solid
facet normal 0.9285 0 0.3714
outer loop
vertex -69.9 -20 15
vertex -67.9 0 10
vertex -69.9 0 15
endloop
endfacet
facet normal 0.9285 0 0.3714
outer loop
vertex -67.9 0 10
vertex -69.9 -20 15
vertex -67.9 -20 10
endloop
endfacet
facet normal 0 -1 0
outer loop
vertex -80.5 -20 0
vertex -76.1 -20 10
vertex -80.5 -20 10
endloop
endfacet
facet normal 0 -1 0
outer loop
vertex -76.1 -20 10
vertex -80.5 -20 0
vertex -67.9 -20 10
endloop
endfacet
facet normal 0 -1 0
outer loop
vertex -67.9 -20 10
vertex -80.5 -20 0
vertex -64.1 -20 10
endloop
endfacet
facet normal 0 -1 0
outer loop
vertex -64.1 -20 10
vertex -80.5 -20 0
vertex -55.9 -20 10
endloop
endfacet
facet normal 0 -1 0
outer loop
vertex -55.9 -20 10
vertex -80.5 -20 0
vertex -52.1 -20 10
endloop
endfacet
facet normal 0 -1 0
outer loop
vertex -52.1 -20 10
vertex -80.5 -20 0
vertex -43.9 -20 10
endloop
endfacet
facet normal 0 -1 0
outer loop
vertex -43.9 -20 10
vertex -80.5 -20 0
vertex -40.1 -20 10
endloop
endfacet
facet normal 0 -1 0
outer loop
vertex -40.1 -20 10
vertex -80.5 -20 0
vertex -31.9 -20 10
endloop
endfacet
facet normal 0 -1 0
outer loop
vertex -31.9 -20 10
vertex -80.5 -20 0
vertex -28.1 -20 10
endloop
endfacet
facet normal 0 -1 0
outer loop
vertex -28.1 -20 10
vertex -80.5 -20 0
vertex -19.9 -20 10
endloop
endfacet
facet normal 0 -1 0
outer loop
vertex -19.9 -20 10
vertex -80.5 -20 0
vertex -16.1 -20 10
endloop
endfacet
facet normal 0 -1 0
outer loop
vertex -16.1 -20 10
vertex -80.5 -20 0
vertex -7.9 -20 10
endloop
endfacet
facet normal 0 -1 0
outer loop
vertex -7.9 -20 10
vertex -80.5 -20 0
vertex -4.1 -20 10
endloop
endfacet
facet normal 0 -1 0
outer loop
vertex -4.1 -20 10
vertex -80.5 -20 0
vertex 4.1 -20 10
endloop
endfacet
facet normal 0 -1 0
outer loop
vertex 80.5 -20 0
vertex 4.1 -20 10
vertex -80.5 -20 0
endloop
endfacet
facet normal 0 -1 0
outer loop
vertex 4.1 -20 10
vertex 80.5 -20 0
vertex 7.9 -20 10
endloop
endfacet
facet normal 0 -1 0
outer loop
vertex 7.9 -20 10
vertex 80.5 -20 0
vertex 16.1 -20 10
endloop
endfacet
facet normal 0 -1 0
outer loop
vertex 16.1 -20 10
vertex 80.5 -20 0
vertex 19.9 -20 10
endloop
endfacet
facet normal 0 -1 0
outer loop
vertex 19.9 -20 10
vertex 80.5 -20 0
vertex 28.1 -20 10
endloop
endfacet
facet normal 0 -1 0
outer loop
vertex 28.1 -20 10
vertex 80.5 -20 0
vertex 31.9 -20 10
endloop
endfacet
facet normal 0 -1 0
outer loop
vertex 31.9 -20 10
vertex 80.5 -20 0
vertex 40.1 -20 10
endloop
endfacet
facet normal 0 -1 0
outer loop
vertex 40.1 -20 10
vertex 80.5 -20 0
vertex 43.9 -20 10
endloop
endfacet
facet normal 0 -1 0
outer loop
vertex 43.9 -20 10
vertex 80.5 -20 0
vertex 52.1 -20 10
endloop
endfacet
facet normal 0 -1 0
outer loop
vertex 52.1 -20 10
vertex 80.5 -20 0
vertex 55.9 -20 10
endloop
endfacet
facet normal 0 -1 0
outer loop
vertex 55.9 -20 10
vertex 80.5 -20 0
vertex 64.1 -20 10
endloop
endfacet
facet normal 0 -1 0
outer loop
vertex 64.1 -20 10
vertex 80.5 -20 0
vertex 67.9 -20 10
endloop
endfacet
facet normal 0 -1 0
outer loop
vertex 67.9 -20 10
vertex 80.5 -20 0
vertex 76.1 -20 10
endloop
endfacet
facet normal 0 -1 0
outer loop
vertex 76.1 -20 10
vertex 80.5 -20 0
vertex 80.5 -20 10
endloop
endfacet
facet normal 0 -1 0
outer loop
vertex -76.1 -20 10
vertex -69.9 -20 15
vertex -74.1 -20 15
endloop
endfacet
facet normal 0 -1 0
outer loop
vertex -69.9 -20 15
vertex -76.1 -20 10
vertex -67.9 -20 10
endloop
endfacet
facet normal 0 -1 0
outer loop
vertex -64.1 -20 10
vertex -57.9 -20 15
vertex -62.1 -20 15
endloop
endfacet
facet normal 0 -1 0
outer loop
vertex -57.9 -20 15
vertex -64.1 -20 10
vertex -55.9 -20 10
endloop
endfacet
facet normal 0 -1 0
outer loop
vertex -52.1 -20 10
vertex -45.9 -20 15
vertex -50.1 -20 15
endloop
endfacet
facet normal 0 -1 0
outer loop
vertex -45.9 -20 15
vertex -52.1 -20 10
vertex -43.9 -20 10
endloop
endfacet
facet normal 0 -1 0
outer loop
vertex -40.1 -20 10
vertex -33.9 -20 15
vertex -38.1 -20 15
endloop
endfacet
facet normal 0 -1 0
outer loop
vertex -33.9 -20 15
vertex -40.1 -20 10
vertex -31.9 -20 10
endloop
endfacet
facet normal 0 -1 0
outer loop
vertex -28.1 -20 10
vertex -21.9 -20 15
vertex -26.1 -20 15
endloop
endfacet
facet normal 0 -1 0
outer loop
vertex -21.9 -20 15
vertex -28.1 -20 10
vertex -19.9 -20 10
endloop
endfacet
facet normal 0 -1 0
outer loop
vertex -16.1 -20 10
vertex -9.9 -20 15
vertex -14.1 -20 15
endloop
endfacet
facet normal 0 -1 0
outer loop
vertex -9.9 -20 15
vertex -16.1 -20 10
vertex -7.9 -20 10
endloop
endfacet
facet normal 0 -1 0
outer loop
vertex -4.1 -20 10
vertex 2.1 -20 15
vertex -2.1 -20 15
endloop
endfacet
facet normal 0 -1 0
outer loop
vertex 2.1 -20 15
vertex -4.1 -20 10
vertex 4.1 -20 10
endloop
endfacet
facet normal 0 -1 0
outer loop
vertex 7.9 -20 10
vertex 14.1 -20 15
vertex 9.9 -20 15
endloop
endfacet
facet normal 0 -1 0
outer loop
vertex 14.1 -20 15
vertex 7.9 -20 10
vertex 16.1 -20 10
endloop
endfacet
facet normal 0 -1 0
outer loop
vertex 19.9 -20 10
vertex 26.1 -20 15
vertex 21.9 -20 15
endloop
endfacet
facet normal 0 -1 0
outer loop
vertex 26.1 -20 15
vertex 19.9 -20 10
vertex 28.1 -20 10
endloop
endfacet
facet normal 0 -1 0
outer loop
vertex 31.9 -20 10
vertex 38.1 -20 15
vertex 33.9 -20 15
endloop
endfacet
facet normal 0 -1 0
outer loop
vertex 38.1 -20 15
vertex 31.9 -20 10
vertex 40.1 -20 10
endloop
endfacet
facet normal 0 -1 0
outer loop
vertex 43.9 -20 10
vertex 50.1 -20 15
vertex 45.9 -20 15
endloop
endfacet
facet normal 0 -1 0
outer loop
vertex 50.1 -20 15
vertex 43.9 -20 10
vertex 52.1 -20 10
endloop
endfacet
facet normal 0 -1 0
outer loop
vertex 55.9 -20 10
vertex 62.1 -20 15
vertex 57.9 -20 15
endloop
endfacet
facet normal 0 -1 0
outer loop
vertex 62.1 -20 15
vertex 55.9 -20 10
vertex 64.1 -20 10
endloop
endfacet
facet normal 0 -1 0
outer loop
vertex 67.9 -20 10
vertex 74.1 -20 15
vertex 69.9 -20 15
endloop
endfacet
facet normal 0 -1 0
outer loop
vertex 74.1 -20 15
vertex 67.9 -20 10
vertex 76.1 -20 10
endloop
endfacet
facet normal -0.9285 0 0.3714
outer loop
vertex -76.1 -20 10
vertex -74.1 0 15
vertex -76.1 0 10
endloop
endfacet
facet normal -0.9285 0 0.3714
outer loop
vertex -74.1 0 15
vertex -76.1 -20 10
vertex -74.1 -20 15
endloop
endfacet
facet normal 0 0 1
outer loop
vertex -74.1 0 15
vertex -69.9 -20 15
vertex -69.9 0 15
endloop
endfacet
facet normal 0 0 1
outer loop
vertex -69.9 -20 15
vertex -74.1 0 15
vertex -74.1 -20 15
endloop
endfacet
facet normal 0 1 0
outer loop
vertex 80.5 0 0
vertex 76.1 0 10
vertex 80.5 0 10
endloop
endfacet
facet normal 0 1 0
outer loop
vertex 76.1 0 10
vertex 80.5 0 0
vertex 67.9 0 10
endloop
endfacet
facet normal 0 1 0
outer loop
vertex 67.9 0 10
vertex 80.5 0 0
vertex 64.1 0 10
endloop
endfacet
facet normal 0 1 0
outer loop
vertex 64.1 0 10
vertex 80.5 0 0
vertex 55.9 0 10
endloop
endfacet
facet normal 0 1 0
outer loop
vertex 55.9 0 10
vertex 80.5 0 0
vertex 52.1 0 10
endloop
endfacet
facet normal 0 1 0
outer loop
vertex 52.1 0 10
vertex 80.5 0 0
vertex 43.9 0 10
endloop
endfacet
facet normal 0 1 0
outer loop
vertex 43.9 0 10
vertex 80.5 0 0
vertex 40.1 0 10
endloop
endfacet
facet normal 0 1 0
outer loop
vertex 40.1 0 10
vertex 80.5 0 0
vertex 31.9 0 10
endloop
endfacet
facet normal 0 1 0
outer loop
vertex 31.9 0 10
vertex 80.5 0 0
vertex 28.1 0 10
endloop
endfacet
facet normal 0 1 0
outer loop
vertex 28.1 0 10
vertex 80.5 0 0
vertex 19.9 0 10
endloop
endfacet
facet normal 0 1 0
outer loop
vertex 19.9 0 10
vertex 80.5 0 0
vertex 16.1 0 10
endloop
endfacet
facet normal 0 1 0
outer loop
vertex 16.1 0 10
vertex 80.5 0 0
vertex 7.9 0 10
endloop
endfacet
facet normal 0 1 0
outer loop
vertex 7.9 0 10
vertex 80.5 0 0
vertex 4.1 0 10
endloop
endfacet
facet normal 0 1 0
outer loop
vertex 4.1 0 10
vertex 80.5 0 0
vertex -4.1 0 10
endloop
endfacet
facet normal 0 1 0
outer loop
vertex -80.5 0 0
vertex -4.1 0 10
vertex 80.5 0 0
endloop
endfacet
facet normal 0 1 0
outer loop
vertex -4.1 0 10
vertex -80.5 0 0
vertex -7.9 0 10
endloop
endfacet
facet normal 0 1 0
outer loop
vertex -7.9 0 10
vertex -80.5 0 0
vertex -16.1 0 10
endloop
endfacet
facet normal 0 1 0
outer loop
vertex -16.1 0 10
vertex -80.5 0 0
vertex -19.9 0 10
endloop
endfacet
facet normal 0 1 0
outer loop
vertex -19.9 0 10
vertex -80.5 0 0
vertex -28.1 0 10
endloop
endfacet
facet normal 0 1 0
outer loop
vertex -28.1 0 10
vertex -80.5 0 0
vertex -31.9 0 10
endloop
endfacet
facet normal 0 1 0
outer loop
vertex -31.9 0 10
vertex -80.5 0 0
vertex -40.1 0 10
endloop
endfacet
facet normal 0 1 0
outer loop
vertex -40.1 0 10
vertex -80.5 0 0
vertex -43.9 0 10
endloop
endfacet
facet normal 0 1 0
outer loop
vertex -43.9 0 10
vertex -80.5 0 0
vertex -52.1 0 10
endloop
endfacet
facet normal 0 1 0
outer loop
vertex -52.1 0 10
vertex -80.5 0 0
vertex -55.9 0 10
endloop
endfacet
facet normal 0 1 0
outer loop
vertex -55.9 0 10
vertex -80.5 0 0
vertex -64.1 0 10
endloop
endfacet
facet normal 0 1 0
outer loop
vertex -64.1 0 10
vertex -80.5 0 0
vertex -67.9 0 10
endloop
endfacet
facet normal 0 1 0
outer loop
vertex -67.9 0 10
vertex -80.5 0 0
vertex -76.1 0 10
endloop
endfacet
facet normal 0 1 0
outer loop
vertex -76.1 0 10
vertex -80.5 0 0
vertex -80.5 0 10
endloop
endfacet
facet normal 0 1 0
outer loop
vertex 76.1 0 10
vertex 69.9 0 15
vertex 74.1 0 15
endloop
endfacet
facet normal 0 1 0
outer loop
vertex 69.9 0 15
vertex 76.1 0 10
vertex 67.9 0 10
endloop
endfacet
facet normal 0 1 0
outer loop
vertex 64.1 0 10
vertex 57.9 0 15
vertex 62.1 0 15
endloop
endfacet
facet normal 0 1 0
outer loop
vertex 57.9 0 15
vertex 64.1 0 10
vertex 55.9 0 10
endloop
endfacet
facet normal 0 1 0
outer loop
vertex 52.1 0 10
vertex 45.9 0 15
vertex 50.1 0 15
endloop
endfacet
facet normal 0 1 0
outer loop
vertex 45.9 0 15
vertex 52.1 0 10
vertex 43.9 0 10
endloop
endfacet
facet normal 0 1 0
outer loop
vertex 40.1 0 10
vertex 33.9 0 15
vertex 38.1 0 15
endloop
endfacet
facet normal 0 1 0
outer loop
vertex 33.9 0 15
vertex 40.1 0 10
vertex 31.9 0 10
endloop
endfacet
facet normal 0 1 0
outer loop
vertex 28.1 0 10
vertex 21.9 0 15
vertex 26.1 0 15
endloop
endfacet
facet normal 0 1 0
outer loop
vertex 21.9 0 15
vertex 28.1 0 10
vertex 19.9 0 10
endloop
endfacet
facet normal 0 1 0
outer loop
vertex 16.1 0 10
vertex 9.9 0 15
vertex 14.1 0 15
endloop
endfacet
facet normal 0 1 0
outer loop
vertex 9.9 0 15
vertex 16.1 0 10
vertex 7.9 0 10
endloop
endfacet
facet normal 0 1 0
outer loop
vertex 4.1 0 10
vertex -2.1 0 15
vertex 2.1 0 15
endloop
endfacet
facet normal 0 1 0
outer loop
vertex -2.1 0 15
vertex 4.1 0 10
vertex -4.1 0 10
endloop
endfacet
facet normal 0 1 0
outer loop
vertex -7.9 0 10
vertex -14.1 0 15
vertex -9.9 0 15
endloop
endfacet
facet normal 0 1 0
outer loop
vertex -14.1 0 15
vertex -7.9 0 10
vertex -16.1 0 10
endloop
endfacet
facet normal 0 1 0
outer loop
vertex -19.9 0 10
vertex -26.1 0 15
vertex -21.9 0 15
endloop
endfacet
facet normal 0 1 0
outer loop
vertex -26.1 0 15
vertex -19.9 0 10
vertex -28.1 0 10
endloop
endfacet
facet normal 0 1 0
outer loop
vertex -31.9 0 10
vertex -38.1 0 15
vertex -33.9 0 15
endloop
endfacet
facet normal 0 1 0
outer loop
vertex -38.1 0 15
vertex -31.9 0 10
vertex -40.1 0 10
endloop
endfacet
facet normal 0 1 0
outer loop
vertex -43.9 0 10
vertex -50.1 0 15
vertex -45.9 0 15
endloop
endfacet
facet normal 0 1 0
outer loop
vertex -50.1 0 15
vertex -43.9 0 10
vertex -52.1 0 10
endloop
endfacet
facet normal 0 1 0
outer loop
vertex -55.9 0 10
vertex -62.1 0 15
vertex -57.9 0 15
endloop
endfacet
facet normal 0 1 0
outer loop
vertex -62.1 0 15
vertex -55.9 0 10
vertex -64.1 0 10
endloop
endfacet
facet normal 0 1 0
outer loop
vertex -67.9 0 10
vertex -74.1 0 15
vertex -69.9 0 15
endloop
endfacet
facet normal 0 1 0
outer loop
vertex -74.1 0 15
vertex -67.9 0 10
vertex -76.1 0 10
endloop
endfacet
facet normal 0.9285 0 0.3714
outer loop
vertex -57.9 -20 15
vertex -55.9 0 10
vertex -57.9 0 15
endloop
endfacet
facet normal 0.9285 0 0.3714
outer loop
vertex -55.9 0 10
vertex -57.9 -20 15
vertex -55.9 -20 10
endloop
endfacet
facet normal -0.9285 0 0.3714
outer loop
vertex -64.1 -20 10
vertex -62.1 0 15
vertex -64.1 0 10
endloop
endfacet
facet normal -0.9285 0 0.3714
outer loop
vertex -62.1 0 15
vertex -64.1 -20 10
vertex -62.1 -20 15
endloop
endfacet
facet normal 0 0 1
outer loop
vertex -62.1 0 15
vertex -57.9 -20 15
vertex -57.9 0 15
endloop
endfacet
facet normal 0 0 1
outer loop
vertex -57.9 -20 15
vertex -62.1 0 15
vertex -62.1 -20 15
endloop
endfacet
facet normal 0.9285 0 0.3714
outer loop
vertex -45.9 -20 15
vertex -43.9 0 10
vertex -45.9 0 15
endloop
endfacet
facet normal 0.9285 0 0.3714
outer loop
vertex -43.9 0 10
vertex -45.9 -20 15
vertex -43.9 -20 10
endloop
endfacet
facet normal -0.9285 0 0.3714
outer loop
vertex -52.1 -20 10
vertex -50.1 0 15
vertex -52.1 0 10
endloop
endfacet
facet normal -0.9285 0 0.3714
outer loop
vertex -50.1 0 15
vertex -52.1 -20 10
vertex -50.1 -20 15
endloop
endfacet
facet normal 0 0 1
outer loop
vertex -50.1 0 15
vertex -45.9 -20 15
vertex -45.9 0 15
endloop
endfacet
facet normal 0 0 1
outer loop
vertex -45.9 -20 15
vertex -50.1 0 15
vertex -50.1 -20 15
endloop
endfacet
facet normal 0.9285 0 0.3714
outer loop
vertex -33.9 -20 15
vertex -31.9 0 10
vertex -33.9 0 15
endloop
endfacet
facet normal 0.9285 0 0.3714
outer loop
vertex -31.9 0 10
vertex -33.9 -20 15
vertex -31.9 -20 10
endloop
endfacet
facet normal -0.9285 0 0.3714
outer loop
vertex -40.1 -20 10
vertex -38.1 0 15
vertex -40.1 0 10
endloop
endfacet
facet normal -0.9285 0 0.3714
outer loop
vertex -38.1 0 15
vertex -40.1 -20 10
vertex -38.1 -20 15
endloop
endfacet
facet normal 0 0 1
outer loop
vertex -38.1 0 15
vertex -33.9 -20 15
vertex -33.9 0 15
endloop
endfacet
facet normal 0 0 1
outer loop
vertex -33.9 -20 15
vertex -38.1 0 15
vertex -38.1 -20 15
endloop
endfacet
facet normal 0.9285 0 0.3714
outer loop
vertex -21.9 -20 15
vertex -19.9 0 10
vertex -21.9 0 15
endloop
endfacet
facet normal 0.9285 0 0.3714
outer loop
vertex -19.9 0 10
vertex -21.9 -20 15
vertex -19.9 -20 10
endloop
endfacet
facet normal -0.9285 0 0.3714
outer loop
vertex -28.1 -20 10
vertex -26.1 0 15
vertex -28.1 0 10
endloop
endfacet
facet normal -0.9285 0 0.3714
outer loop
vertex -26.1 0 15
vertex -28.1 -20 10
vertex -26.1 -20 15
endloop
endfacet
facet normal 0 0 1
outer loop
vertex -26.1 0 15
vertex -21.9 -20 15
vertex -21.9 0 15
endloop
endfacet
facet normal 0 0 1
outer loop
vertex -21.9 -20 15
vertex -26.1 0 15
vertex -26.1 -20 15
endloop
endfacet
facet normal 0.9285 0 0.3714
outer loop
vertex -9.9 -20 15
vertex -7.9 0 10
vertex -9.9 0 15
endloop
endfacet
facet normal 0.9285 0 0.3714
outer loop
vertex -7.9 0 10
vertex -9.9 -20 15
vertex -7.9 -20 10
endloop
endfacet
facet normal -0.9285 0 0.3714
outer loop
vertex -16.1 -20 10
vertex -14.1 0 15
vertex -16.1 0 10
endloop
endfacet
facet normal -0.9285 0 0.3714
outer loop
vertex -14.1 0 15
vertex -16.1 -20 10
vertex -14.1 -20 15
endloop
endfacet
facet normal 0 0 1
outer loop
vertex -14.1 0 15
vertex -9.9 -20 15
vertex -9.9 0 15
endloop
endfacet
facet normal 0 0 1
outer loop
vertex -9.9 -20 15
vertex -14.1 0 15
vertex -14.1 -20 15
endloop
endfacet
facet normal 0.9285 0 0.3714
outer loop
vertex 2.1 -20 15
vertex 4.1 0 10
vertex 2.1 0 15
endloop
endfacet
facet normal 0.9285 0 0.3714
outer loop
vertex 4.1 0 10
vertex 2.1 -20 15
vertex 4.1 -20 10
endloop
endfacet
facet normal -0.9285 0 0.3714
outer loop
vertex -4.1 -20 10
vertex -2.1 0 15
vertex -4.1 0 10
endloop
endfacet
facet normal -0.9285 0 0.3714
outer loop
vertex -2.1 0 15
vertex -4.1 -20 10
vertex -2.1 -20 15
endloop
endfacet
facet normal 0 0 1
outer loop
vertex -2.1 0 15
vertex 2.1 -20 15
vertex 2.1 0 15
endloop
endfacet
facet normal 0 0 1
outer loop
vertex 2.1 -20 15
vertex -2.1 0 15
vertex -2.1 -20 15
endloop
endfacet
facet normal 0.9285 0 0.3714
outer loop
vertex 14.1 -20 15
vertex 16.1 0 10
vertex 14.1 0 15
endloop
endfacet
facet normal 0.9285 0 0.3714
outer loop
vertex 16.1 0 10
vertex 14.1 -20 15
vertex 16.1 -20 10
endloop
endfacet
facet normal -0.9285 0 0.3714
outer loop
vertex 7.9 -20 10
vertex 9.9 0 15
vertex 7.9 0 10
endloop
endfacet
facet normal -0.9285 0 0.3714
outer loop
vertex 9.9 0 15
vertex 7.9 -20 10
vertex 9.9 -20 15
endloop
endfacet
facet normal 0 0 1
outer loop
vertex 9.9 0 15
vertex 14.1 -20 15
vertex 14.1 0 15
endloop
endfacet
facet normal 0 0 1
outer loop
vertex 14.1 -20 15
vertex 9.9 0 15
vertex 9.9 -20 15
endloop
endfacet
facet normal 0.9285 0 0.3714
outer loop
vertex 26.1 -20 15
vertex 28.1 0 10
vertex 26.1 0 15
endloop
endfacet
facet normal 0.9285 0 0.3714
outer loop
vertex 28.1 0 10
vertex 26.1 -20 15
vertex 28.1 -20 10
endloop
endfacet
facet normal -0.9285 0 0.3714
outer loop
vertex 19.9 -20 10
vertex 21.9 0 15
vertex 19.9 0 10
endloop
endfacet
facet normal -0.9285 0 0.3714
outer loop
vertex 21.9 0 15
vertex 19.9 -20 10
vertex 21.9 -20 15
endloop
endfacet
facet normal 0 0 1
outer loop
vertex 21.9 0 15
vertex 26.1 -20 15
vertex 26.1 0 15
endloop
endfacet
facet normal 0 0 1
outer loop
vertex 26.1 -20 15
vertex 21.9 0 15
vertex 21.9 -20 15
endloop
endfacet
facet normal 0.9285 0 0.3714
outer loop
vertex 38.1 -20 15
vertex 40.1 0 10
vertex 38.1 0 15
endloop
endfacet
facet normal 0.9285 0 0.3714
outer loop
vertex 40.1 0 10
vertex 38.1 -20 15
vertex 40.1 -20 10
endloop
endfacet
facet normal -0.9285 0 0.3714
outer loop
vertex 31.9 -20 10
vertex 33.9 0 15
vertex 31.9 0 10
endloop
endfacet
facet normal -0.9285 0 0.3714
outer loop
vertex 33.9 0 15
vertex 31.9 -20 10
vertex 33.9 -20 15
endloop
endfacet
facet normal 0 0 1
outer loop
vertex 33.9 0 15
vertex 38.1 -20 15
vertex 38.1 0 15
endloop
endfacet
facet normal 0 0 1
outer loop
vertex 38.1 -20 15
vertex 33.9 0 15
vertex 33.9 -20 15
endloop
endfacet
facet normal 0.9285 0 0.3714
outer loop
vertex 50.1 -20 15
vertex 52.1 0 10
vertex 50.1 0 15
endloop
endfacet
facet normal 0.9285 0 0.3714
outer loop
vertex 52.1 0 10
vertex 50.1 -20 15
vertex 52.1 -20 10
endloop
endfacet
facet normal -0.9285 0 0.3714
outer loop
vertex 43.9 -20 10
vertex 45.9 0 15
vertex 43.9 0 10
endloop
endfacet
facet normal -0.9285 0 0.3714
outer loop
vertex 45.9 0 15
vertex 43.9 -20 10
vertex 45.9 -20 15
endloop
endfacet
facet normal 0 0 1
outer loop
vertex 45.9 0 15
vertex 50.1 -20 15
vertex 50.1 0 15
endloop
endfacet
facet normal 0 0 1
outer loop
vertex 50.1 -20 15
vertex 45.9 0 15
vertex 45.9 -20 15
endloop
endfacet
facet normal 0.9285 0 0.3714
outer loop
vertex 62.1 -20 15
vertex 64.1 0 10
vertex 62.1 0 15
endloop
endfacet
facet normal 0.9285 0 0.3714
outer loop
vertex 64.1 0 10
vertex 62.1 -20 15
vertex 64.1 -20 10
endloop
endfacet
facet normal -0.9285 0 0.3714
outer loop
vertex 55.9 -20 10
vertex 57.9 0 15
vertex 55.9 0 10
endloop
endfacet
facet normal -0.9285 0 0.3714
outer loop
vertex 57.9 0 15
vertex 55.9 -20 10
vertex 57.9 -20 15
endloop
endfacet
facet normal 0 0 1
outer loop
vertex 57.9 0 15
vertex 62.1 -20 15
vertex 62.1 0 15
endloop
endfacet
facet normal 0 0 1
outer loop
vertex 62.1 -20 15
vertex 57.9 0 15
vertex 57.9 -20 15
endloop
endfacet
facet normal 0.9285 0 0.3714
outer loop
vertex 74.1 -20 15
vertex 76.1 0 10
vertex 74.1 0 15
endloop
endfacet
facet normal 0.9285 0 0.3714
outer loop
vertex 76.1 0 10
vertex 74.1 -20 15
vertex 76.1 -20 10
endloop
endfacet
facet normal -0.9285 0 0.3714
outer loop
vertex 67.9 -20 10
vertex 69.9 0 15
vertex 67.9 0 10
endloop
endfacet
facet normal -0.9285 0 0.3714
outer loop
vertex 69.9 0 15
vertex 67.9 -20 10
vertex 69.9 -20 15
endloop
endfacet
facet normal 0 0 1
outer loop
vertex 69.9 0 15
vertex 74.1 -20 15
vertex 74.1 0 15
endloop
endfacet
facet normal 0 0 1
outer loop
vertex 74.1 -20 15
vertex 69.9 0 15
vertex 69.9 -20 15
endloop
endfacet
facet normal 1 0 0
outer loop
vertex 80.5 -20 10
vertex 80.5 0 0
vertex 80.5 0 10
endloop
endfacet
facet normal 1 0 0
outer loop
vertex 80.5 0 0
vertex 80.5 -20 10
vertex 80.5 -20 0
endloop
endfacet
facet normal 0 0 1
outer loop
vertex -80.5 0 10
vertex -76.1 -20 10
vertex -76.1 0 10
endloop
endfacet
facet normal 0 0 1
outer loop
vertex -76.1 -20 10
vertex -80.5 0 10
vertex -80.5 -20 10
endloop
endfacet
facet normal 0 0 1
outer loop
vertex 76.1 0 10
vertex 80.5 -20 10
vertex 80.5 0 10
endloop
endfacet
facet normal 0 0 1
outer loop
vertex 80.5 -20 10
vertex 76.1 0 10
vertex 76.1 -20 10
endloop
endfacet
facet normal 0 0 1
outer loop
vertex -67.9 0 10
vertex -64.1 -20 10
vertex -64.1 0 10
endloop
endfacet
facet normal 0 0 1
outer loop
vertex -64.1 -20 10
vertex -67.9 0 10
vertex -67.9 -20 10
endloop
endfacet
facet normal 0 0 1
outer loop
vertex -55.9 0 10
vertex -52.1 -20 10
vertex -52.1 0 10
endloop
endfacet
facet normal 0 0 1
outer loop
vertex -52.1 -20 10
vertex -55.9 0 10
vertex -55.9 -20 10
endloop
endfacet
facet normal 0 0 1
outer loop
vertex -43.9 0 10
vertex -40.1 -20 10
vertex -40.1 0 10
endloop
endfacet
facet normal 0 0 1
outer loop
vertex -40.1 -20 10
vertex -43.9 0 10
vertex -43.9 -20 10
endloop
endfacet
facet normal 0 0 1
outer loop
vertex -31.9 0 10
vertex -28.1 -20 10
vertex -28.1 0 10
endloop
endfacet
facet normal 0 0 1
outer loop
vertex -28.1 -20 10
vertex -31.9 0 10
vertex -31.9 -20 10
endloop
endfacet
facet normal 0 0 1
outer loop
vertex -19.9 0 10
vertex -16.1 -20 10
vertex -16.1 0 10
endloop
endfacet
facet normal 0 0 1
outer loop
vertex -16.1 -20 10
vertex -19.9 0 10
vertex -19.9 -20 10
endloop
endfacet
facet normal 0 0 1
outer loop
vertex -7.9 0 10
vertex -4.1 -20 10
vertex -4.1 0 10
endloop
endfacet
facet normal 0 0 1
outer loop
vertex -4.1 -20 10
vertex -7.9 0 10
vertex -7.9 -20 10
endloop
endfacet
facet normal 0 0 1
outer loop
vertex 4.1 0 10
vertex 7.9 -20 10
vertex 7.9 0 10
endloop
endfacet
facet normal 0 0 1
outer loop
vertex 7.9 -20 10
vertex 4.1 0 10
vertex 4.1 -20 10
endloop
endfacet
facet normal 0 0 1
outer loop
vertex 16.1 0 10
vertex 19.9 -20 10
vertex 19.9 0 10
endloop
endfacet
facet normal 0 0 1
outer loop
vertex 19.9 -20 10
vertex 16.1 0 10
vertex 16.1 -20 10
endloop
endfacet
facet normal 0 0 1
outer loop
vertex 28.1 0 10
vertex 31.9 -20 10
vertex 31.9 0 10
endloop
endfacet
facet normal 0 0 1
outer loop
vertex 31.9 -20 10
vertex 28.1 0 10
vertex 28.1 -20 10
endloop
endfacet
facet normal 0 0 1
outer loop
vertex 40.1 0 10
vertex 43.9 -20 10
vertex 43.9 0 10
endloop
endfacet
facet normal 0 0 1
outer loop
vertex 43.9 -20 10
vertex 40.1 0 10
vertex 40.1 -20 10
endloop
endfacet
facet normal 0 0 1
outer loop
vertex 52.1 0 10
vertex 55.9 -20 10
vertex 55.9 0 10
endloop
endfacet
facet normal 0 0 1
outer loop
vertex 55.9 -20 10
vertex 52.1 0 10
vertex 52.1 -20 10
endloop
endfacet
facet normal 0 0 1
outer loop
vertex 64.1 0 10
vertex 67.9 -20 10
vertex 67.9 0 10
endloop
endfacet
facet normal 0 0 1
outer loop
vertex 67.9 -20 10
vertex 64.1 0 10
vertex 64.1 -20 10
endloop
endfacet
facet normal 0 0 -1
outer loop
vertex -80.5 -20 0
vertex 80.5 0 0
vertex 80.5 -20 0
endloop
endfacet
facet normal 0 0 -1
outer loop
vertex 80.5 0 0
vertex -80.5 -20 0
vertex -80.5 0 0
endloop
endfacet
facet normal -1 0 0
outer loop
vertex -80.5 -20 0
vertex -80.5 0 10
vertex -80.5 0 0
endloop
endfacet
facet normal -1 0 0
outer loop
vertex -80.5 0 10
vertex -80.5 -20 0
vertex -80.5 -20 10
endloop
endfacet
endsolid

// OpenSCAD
$fn = 32;

// ----------------------------------------------------------------------
// Toothed rack, 13 teeth
// 12 mm pitch, 5 mm teeth
// ----------------------------------------------------------------------

// --- parameters (mm) ---
bar_w = 20;     // bar width (Y)
bar_h = 10;     // bar height (Z)
teeth = 13;     // number of teeth
pitch = 12;     // tooth pitch
tooth_h = 5;    // tooth height above the bar
root_w = 9;     // tooth width at the root
crest_w = 4.2;  // tooth width at the crest

// --- derived feature positions (mm) ---
span = (teeth - 1) * pitch;  // = 144   distance between the outer teeth
bar_l = span + root_w + 8;   // = 161   bar length: teeth plus 4 mm at each end
tooth_x = -span / 2;         // = -72   X of the first tooth
height = bar_h + tooth_h;    // = 15   overall height
feature_centers = [
  [tooth_x + 0 * pitch, -bar_w / 2],
  [tooth_x + 1 * pitch, -bar_w / 2],
  [tooth_x + 2 * pitch, -bar_w / 2],
  [tooth_x + 3 * pitch, -bar_w / 2],
  [tooth_x + 4 * pitch, -bar_w / 2],
  [tooth_x + 5 * pitch, -bar_w / 2],
  [tooth_x + 6 * pitch, -bar_w / 2],
  [tooth_x + 7 * pitch, -bar_w / 2],
  [tooth_x + 8 * pitch, -bar_w / 2],
  [tooth_x + 9 * pitch, -bar_w / 2],
  [tooth_x + 10 * pitch, -bar_w / 2],
  [tooth_x + 11 * pitch, -bar_w / 2],
  [tooth_x + 12 * pitch, -bar_w / 2]
];   // tooth centre line, drives the tooth loop

// bar with a rack of teeth, one extruded trapezoium per centre
module rack_tooth() {
  linear_extrude(height = bar_w)
    polygon(points = [
      [0, 0],
      [root_w, 0],
      [root_w / 2 + crest_w / 2, tooth_h + 1],
      [root_w / 2 - crest_w / 2, tooth_h + 1]
    ]);
}

union() {
  translate([-bar_l / 2, -bar_w, 0]) cube([bar_l, bar_w, bar_h]);
  for (centre = feature_centers)
    translate([centre[0] - root_w / 2, 0, bar_h - 1]) rotate([90, 0, 0]) rack_tooth();
}
